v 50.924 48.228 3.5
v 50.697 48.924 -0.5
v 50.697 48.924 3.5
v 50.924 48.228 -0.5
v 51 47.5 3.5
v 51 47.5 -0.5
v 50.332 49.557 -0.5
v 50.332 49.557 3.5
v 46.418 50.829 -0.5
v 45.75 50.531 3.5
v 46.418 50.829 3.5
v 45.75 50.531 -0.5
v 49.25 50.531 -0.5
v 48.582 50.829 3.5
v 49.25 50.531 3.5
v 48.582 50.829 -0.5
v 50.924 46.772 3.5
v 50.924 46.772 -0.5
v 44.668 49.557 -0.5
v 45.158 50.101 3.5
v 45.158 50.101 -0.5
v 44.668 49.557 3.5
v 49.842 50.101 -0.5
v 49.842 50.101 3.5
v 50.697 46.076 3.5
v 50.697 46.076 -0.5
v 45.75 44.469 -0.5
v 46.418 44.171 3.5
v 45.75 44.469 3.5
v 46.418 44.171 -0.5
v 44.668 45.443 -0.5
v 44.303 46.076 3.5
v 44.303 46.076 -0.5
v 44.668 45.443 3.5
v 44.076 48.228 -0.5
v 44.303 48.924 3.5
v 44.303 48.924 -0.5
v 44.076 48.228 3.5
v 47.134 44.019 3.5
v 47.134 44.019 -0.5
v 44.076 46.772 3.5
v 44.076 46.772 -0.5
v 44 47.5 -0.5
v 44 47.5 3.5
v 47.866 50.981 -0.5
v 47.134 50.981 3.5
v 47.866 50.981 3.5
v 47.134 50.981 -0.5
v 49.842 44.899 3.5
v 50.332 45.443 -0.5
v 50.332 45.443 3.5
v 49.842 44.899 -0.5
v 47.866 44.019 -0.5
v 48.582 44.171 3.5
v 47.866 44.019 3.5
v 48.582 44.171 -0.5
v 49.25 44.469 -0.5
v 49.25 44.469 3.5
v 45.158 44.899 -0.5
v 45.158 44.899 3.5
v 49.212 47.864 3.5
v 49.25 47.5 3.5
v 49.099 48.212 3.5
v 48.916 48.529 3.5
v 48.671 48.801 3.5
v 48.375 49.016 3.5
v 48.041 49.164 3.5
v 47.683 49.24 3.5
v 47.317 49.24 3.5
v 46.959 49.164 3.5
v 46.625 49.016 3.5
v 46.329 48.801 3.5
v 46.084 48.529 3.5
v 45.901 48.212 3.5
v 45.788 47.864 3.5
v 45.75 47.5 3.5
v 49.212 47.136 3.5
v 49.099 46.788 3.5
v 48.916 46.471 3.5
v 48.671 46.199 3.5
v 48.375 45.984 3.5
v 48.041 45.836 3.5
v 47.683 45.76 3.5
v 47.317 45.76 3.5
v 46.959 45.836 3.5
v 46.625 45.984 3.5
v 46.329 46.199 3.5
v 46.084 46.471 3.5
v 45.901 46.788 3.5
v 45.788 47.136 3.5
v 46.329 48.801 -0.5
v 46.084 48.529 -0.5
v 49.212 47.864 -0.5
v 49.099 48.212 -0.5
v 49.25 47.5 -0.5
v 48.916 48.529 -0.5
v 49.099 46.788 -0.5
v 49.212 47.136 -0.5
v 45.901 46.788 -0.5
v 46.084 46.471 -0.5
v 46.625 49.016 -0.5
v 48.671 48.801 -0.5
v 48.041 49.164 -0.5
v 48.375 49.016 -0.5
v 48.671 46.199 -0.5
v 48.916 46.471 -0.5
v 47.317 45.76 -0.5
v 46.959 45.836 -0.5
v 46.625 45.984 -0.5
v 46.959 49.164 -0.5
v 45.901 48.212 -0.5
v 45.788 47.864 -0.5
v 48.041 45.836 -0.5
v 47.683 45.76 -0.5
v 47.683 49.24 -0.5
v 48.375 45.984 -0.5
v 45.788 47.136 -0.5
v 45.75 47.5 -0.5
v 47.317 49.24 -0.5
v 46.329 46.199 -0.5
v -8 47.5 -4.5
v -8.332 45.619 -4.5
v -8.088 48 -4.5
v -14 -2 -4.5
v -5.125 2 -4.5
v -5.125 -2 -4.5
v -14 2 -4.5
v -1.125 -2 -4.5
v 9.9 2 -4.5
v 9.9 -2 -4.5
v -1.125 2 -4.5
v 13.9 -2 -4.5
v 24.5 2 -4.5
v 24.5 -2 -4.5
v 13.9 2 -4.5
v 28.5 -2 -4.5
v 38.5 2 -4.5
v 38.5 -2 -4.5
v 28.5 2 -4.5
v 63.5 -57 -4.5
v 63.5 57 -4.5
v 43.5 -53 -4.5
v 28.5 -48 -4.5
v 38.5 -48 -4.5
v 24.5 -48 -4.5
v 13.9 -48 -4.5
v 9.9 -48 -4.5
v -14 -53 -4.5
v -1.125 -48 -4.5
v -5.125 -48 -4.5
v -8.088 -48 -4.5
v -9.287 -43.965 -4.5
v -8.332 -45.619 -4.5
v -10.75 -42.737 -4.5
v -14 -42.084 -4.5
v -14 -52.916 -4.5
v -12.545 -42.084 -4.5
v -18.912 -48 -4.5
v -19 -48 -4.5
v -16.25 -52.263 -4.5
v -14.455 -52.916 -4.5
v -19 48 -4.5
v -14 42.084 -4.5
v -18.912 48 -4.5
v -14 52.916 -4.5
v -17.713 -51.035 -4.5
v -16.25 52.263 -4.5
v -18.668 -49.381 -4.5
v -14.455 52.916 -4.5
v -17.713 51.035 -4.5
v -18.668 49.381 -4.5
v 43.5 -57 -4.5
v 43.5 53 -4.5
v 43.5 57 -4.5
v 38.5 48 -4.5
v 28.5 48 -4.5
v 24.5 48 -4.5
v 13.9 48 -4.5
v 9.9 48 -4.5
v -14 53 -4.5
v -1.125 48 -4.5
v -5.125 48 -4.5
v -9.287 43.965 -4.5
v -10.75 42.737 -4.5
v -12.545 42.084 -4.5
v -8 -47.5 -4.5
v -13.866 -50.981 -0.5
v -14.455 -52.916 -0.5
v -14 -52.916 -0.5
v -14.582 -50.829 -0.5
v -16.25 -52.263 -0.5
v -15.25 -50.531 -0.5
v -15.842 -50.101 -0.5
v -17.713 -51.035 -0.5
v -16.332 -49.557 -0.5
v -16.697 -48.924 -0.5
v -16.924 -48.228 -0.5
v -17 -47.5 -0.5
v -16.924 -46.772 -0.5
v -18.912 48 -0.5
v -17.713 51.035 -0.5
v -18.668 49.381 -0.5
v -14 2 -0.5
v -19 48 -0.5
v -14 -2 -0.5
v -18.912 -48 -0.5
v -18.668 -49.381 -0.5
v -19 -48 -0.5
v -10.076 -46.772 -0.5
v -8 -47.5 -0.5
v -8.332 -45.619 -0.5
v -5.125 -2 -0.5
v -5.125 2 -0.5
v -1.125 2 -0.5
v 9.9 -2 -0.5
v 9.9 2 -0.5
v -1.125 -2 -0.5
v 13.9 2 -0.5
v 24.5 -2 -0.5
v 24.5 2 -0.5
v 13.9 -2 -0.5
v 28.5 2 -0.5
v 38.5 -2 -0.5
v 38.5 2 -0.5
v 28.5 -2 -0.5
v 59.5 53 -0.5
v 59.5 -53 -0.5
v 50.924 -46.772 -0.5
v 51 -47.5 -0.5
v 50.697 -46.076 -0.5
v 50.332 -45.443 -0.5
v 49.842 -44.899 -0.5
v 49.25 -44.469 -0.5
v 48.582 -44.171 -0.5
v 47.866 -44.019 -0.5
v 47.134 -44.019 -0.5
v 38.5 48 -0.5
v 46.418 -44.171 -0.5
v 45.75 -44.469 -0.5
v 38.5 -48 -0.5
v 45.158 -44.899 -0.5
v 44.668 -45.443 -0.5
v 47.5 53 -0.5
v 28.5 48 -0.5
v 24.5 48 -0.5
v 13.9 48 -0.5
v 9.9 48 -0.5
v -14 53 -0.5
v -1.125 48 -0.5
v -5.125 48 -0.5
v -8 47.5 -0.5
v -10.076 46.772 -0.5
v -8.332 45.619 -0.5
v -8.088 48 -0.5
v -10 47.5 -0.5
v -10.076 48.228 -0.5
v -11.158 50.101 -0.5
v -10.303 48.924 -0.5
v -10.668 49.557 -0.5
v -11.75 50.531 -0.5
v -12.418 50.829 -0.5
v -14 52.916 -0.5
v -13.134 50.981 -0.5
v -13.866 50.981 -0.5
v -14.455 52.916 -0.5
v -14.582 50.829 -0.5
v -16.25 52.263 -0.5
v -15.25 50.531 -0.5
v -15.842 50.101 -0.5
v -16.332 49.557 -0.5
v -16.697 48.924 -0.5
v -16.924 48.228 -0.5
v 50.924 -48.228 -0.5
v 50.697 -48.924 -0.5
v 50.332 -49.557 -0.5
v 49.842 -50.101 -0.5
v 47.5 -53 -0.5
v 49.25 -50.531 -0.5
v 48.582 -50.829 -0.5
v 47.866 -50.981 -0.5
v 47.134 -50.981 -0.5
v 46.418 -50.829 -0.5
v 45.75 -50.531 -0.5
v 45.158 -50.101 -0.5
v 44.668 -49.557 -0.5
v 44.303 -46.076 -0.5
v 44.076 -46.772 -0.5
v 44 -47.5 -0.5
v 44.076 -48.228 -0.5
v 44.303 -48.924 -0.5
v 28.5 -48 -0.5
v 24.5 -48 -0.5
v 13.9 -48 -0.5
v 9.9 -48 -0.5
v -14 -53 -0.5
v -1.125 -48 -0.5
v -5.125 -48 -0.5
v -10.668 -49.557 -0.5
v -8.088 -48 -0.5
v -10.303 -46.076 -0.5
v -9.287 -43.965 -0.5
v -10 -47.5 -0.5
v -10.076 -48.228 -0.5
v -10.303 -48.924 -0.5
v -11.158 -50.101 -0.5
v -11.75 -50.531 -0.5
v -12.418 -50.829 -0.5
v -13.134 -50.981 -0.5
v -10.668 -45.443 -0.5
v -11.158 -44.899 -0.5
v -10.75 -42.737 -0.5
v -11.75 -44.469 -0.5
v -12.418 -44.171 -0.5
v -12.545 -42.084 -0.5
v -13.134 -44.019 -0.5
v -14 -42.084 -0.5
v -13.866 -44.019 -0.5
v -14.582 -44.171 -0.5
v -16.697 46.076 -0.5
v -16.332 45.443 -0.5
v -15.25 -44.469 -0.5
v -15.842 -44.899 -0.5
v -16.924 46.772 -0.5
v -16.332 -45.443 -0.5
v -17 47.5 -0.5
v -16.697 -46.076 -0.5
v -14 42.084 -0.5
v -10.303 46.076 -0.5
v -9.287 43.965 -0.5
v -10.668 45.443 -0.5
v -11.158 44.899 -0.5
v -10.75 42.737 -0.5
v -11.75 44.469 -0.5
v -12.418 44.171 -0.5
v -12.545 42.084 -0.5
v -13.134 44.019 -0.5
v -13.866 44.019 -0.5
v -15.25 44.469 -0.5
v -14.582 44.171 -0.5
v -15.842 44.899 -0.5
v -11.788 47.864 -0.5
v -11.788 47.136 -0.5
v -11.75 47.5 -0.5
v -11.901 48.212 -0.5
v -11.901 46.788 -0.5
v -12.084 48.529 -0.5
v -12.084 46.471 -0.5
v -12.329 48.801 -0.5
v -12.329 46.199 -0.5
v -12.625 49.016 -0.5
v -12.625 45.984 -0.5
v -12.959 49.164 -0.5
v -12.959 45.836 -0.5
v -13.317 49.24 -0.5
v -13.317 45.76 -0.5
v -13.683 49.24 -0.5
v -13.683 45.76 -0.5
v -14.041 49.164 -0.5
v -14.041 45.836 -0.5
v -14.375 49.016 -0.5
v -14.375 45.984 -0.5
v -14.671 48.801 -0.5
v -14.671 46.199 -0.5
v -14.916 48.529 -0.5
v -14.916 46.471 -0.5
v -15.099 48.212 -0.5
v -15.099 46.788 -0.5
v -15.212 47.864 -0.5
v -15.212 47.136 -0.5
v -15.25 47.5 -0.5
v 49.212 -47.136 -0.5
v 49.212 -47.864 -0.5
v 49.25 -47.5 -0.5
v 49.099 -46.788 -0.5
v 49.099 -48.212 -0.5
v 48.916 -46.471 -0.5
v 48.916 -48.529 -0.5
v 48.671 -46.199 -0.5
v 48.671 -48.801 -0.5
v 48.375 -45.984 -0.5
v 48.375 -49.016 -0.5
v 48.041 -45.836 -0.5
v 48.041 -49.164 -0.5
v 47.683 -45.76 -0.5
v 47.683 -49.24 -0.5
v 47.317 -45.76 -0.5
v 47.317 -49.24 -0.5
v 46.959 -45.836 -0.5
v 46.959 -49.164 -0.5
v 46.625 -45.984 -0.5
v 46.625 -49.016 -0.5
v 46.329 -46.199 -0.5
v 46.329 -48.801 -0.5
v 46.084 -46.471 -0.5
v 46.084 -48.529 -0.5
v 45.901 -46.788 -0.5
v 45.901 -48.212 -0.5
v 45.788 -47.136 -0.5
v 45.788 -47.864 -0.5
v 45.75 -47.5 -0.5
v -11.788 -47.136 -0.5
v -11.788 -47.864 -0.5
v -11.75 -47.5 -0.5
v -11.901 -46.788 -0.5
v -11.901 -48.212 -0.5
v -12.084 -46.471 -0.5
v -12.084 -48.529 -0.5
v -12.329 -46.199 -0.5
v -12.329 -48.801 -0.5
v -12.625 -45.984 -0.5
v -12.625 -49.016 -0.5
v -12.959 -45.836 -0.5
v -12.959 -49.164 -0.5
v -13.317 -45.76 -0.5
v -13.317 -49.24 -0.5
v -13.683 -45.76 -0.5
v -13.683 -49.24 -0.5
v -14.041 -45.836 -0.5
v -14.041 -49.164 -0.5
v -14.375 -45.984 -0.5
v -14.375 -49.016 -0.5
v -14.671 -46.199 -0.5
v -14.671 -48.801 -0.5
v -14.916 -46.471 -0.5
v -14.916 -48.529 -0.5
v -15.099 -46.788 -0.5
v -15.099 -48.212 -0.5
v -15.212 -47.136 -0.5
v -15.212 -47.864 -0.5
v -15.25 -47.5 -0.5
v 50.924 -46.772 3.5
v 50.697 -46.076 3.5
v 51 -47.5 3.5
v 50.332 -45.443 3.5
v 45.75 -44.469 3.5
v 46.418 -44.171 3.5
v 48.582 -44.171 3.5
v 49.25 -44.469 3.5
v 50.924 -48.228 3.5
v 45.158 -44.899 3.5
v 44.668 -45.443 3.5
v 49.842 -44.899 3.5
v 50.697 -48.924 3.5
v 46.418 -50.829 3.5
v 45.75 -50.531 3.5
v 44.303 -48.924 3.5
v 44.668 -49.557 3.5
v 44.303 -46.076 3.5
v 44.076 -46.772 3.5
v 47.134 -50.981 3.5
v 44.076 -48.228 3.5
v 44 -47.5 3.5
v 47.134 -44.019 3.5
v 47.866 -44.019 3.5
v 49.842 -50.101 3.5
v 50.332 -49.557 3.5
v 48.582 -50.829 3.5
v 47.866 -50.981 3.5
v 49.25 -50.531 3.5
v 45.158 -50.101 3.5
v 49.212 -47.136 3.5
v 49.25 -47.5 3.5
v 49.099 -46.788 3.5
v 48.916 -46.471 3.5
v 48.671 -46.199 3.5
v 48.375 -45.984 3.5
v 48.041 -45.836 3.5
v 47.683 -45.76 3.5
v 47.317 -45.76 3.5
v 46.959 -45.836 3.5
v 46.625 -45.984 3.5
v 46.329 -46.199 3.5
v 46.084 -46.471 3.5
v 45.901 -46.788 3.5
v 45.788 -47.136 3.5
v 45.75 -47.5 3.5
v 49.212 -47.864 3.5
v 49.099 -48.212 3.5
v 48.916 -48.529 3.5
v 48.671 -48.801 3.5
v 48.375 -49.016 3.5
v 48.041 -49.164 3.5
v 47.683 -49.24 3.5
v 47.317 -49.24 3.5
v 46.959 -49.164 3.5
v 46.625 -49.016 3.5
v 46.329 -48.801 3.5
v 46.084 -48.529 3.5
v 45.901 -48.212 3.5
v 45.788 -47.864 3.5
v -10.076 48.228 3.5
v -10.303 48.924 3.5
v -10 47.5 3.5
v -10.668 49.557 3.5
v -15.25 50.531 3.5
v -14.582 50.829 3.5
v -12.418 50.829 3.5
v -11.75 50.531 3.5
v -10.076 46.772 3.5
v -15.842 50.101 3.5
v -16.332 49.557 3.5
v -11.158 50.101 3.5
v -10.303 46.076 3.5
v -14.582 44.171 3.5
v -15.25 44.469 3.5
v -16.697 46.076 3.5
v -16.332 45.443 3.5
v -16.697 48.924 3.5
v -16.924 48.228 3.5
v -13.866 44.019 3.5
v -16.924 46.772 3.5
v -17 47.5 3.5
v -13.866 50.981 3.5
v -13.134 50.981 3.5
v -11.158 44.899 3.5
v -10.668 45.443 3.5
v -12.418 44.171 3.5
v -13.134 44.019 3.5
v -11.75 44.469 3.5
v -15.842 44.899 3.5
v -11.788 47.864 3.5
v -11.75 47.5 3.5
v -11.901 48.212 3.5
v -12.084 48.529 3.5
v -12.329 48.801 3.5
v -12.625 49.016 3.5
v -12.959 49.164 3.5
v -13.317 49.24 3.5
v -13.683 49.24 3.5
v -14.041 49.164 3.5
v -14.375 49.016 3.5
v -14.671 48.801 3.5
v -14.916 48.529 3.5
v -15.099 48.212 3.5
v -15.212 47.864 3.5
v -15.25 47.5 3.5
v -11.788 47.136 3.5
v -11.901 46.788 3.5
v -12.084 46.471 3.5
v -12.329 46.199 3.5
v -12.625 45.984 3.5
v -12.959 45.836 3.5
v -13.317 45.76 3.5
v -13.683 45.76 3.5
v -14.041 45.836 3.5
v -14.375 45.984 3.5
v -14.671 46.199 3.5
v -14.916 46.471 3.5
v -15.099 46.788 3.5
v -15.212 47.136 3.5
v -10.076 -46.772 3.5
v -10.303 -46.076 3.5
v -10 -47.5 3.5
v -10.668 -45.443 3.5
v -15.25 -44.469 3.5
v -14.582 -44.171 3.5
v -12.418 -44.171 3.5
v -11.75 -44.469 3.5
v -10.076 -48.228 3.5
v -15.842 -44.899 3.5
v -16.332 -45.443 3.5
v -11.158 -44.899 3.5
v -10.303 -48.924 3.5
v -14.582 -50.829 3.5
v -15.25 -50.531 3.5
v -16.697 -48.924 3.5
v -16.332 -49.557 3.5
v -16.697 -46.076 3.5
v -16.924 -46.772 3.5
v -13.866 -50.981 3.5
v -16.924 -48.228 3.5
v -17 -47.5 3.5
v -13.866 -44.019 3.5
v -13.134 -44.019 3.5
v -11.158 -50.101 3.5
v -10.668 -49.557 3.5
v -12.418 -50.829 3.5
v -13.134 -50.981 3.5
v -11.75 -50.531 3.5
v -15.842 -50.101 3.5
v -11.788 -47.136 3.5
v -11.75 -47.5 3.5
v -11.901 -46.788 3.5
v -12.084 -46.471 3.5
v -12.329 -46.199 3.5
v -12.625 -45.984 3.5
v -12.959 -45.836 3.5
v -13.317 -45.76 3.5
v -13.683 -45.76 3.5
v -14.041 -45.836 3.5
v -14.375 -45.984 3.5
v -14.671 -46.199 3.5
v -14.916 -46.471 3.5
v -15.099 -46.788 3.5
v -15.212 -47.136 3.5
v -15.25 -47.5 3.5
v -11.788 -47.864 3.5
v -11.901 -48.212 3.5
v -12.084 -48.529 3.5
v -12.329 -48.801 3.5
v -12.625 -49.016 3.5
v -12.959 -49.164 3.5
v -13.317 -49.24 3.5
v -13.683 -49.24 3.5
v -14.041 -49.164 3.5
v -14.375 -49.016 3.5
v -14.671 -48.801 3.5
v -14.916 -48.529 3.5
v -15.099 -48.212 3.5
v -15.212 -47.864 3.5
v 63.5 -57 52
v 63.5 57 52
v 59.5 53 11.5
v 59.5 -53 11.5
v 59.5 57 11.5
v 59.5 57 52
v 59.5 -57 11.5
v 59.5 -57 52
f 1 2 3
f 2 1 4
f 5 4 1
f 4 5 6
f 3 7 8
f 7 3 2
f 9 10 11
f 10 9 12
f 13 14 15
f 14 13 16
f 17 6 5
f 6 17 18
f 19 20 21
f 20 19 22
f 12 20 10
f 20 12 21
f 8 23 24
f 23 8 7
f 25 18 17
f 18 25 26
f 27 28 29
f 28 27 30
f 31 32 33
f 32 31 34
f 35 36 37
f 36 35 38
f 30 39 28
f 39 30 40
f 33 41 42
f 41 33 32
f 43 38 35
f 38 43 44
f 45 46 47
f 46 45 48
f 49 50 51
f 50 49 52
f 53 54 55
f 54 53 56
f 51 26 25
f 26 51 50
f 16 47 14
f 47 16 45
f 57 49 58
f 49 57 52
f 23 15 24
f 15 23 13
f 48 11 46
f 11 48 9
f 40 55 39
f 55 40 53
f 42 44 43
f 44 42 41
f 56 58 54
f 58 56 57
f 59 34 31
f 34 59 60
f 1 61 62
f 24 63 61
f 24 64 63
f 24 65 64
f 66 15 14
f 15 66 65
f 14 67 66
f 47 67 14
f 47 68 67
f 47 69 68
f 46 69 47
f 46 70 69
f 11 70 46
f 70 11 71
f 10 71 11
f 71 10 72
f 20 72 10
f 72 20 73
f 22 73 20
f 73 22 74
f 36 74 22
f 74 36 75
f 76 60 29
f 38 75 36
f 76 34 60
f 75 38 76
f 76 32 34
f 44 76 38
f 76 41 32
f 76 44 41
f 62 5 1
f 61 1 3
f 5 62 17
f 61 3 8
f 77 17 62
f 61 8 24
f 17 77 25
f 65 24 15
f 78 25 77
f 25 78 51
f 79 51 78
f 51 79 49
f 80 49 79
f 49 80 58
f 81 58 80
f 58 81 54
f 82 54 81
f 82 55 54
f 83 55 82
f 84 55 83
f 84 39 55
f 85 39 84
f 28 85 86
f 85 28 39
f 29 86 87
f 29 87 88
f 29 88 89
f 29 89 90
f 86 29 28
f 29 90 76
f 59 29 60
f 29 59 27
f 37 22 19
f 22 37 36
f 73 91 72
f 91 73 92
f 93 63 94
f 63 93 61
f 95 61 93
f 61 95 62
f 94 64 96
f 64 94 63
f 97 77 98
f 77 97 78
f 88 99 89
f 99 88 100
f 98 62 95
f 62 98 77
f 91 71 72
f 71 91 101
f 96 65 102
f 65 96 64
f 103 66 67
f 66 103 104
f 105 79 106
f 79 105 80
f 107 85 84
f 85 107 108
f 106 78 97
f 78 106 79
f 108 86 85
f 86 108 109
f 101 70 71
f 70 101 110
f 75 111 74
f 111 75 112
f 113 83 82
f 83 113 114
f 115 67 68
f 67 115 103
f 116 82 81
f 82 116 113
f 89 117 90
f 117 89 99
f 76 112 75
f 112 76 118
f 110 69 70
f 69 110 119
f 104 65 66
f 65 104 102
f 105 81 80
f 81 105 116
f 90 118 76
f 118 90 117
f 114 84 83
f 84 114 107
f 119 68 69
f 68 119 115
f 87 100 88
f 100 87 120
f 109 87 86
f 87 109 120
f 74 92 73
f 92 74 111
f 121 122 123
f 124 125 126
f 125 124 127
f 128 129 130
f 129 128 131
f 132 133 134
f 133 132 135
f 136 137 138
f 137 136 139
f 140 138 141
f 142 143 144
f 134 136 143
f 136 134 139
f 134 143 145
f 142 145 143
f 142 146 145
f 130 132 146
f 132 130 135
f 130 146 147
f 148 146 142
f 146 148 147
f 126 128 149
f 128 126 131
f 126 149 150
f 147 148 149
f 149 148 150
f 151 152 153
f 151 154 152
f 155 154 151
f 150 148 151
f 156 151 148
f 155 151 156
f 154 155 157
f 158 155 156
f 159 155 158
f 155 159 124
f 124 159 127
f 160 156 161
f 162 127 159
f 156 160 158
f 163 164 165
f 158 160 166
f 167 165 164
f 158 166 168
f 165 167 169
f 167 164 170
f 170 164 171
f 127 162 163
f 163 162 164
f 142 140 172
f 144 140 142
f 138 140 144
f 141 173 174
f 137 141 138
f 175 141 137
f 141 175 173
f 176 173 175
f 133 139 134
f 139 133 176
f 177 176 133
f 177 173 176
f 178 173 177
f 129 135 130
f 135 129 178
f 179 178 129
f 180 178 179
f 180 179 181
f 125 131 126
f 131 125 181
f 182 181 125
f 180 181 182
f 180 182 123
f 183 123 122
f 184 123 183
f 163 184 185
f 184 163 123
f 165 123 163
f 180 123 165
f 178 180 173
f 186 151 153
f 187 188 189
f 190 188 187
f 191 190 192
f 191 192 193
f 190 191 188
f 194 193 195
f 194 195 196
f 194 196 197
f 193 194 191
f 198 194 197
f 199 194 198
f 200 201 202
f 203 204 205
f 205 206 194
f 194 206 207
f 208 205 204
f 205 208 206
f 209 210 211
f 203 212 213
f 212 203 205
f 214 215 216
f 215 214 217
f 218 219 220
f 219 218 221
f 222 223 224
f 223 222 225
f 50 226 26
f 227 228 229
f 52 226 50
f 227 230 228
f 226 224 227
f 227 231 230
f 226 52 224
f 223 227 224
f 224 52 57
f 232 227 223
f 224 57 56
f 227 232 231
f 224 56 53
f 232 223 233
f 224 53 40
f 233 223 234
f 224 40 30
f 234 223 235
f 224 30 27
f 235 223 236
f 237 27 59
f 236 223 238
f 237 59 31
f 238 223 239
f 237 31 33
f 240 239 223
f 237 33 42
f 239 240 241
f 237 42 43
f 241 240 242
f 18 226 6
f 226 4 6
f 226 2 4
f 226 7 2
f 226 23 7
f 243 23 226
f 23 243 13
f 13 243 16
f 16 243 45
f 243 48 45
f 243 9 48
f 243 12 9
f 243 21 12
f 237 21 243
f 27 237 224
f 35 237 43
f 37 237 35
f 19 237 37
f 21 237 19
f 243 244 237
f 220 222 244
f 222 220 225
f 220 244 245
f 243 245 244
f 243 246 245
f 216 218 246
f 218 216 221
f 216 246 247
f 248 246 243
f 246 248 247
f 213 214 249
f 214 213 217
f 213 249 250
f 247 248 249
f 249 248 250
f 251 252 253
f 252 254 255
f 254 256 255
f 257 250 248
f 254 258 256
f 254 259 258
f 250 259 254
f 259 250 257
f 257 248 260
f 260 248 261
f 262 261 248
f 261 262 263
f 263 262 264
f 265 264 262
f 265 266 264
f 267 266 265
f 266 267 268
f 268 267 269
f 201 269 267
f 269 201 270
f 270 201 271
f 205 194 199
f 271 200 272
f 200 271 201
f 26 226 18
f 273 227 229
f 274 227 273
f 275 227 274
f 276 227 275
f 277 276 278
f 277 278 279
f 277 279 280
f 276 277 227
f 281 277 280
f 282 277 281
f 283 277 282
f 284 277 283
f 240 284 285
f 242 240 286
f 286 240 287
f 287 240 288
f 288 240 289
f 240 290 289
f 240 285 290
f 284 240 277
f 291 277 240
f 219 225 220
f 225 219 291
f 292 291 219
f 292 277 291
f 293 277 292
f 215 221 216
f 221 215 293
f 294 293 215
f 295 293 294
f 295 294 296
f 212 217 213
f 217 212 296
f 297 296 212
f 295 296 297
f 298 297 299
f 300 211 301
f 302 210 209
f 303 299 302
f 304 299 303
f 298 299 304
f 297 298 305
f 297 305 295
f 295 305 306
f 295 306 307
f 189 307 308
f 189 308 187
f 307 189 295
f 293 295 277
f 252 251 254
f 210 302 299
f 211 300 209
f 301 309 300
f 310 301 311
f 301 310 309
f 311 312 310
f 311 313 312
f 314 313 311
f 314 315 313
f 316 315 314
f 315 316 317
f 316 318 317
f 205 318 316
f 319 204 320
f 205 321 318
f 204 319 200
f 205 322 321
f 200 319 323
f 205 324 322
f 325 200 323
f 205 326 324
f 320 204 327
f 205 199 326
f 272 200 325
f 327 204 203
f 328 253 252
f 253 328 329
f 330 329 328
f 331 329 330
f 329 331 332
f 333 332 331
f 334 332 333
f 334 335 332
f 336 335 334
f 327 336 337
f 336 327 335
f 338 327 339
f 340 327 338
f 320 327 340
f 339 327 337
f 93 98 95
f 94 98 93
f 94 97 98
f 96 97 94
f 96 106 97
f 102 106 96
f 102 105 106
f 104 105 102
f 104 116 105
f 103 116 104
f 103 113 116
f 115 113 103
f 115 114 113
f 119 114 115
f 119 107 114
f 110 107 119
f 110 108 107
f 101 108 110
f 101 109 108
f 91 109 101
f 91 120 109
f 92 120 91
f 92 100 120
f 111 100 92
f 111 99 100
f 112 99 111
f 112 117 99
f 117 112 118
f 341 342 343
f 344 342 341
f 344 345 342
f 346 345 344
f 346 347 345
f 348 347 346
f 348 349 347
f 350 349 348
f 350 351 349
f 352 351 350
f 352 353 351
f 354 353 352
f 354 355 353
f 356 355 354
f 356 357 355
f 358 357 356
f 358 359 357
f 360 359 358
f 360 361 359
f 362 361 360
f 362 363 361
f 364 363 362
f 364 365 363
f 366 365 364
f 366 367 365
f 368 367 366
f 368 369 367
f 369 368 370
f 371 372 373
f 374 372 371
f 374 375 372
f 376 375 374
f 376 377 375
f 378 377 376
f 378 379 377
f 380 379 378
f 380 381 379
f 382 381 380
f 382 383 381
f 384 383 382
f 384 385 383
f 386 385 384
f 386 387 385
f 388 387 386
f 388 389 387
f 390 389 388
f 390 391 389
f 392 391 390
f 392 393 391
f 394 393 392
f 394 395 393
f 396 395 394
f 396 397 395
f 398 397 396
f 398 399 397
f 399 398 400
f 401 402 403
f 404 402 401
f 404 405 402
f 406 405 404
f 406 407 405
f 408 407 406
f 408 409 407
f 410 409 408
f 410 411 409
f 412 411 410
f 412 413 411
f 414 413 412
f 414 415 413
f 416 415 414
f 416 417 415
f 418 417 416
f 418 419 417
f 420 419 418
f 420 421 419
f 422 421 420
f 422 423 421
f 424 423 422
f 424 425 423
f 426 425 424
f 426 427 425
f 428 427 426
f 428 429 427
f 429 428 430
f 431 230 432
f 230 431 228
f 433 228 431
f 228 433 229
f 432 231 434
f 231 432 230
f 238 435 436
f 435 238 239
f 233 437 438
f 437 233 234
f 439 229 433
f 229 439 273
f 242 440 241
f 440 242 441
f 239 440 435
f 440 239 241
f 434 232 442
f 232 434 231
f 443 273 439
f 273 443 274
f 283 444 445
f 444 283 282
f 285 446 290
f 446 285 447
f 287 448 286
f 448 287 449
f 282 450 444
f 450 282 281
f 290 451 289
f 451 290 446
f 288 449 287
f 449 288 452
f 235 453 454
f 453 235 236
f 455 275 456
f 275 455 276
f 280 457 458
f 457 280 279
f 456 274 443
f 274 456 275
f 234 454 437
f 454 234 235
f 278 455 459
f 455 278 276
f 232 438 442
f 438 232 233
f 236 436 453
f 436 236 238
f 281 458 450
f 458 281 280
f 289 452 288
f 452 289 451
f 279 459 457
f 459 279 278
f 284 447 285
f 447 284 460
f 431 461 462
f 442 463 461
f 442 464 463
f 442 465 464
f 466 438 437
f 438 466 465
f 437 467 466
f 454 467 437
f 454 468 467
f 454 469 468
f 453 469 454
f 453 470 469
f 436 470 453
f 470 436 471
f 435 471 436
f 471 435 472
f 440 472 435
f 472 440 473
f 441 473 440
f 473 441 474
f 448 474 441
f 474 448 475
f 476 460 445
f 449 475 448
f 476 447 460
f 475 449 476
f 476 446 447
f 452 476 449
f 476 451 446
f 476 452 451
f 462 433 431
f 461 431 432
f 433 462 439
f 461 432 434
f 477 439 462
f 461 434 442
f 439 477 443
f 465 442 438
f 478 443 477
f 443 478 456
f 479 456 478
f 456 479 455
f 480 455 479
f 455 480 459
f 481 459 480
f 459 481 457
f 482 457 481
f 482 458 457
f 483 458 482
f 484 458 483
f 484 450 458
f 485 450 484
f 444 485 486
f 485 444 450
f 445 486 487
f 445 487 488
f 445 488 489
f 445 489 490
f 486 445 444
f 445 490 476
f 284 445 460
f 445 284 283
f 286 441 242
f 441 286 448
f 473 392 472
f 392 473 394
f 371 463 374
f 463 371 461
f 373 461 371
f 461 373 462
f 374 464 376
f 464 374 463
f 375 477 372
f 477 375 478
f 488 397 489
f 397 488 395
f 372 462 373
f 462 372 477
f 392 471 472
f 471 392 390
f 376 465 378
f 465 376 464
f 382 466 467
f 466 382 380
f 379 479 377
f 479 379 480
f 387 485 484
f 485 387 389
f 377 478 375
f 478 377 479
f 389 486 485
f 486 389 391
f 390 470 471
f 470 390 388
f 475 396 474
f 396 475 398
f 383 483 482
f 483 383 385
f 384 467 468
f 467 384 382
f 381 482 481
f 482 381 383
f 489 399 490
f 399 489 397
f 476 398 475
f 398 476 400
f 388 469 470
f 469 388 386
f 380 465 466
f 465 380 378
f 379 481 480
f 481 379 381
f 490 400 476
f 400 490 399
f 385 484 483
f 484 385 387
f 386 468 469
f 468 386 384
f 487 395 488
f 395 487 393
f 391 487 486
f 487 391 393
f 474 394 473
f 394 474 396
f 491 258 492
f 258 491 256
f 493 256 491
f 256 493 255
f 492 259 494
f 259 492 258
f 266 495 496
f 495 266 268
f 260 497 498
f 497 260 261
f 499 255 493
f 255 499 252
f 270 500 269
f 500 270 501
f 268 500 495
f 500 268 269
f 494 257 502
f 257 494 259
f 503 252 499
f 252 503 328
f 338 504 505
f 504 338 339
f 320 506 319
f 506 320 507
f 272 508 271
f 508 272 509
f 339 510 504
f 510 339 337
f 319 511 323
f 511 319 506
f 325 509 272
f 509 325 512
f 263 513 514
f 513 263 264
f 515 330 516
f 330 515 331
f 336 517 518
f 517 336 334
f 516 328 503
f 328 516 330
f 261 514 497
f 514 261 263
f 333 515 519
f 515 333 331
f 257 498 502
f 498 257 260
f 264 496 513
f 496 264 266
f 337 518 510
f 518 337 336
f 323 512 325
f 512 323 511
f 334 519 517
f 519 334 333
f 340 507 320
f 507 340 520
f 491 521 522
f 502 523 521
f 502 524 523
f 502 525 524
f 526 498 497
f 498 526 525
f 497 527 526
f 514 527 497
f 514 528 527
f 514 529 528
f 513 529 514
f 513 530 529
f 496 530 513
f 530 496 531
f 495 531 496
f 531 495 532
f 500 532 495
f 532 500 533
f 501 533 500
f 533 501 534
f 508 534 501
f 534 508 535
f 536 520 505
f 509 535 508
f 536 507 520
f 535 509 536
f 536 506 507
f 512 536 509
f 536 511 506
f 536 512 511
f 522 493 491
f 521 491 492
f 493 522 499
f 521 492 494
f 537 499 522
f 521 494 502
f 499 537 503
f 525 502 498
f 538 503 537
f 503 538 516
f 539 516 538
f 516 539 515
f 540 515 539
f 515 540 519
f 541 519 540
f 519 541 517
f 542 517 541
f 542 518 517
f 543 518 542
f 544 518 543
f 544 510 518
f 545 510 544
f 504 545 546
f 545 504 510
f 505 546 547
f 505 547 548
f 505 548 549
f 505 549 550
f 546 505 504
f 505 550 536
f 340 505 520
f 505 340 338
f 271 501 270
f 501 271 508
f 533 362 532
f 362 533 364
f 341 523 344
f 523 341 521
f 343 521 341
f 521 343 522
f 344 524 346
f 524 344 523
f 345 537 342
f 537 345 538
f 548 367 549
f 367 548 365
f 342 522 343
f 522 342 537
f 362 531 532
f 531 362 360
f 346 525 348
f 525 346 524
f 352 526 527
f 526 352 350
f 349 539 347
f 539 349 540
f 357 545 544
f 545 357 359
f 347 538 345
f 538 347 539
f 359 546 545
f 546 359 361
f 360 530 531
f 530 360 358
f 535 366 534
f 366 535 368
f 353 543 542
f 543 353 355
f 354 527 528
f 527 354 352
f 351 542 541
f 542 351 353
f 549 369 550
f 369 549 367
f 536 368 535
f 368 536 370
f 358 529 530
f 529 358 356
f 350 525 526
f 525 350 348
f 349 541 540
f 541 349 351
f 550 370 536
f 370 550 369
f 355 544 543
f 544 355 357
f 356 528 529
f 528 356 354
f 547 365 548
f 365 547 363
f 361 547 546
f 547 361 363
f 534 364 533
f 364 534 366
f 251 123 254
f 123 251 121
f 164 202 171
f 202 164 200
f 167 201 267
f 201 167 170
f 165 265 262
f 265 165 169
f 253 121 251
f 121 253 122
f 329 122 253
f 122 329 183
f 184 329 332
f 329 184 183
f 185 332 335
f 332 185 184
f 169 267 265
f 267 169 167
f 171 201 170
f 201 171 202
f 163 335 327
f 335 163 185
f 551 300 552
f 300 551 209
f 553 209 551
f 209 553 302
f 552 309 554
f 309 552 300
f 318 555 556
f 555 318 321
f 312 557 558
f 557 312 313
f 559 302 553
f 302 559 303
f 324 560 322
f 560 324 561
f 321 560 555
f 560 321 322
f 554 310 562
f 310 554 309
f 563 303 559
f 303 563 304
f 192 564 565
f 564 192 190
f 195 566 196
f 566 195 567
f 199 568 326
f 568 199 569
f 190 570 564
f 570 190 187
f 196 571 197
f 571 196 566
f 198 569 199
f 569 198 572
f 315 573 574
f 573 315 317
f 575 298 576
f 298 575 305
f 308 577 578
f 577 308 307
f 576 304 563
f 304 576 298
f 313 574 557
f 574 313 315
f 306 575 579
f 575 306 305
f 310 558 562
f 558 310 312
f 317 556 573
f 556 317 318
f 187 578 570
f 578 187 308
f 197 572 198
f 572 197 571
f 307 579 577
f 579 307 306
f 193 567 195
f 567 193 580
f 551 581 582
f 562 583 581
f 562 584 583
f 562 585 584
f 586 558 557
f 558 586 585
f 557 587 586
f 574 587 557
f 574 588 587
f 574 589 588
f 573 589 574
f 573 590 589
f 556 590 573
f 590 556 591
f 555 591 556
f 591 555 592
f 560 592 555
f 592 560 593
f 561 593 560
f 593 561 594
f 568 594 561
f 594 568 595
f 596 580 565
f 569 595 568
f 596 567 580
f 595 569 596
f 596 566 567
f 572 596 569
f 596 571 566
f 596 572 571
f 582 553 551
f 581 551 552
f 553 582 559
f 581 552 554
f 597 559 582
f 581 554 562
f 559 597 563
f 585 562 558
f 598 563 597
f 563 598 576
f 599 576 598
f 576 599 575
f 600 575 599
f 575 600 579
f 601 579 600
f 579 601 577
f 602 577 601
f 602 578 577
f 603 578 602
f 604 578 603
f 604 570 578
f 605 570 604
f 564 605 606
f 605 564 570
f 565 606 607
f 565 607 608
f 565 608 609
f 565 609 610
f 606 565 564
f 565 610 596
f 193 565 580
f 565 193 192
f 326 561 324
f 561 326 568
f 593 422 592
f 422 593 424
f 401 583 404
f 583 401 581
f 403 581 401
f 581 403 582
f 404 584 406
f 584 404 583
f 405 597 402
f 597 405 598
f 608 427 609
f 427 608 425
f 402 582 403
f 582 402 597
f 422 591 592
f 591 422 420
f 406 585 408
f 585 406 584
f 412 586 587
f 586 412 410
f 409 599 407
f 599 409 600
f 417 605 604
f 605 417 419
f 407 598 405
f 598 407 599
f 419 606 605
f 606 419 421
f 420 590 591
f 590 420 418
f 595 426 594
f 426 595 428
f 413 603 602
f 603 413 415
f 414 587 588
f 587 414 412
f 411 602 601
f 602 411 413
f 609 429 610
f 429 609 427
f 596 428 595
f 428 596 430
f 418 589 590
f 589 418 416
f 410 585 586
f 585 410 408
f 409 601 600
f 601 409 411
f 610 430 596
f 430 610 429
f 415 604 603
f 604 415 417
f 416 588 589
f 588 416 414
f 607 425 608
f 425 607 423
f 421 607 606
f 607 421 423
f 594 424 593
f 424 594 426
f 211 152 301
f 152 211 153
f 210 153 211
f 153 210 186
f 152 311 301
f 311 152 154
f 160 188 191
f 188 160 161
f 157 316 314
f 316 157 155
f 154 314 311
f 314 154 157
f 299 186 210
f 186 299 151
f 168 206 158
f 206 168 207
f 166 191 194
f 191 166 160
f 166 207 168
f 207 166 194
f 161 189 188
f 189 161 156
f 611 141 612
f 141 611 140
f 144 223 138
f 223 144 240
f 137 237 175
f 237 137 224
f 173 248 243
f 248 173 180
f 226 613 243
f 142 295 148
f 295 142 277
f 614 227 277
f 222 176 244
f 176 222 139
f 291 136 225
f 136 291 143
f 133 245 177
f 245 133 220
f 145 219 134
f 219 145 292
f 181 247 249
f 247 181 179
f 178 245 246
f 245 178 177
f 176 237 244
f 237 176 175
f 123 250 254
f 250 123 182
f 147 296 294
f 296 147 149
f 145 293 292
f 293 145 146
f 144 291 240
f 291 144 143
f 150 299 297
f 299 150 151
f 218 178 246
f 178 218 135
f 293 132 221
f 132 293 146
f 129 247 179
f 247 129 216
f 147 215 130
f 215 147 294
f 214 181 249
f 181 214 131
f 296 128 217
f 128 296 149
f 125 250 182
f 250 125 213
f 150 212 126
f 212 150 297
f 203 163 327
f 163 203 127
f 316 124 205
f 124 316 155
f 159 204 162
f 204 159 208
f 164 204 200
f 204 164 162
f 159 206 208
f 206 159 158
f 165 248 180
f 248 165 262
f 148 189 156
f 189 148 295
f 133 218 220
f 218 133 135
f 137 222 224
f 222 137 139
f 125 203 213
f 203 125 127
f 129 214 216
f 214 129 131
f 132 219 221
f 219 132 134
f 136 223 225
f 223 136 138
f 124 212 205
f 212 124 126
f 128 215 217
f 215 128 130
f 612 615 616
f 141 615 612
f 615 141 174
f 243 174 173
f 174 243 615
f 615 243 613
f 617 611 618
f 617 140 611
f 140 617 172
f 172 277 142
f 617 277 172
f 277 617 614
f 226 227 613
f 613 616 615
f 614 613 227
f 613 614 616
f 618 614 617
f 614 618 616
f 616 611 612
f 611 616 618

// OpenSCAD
module ramboholes() {
	difference() {
		cylinder(r=7/2, h=7, center=true, $fn=30);
		cylinder(r=7/4, h=8, center=true, $fn=30);
	}
}

module rambopegs() {
	union() {
		translate([95/2, 95/2, 0]) {
			ramboholes();
			translate([0,0,-2.5]) cylinder(r=11/2, h=4, center=true);
		}
		translate([95/2, -95/2, 0]) {
			ramboholes();
			translate([0,0,-2.5]) cylinder(r=11/2, h=4, center=true);
		}
		translate([-13.5, 95/2, 0]) {
			ramboholes();
			translate([0,0,-2.5]) cylinder(r=11/2, h=4, center=true);
		}
		translate([-13.5, -95/2, 0]) {
			ramboholes();
			translate([0,0,-2.5]) cylinder(r=11/2, h=4, center=true);
		}
	}
}
module ramboframe() {
	translate([102/2,0,-2.5]) cube(size=[25,106, 4], center=true);

	translate([102/3 - 7.5,0,-2.5]) cube(size=[4,96, 4], center=true);
	translate([102/5 - 8.5,0,-2.5]) cube(size=[4,96, 4], center=true);
	translate([102/16 - 9.5,0,-2.5]) cube(size=[4,96, 4], center=true);
	translate([-96/16 - 10.5,0,-2.5]) cube(size=[5,96, 4], center=true);
    
    translate([17,101/2,-2.5]) cube(size=[62,5, 4], center=true);
	translate([17,-101/2,-2.5]) cube(size=[62,5, 4], center=true);
	translate([17,0,-2.5]) cube(size=[66,4, 4], center=true);
}


module arduino()
{
	translate([119/2, -114/2, -1]) rotate([90, 0, 90]) {
		difference() {
			// the arduino cube
			cube([114, 53, 4]);
		}
	}
}

module mountBraces()
{
	 rotate([90, -90, 0]) {
		translate([-4.5, -127/2, -110/2])
		linear_extrude(height = 4, center = true, convexity = 10, twist = 0)
		polygon(points=[[0,0],[20,0],[0,20]]);
		
		translate([-4.5, -127/2, 110/2])
		linear_extrude(height = 4, center = true, convexity = 10, twist = 0)
		polygon(points=[[0,0],[20,0],[0,20]]);
	}
}

module rambo()
{
	rambopegs();
	ramboframe();
}



rambo();
arduino();
mountBraces();
